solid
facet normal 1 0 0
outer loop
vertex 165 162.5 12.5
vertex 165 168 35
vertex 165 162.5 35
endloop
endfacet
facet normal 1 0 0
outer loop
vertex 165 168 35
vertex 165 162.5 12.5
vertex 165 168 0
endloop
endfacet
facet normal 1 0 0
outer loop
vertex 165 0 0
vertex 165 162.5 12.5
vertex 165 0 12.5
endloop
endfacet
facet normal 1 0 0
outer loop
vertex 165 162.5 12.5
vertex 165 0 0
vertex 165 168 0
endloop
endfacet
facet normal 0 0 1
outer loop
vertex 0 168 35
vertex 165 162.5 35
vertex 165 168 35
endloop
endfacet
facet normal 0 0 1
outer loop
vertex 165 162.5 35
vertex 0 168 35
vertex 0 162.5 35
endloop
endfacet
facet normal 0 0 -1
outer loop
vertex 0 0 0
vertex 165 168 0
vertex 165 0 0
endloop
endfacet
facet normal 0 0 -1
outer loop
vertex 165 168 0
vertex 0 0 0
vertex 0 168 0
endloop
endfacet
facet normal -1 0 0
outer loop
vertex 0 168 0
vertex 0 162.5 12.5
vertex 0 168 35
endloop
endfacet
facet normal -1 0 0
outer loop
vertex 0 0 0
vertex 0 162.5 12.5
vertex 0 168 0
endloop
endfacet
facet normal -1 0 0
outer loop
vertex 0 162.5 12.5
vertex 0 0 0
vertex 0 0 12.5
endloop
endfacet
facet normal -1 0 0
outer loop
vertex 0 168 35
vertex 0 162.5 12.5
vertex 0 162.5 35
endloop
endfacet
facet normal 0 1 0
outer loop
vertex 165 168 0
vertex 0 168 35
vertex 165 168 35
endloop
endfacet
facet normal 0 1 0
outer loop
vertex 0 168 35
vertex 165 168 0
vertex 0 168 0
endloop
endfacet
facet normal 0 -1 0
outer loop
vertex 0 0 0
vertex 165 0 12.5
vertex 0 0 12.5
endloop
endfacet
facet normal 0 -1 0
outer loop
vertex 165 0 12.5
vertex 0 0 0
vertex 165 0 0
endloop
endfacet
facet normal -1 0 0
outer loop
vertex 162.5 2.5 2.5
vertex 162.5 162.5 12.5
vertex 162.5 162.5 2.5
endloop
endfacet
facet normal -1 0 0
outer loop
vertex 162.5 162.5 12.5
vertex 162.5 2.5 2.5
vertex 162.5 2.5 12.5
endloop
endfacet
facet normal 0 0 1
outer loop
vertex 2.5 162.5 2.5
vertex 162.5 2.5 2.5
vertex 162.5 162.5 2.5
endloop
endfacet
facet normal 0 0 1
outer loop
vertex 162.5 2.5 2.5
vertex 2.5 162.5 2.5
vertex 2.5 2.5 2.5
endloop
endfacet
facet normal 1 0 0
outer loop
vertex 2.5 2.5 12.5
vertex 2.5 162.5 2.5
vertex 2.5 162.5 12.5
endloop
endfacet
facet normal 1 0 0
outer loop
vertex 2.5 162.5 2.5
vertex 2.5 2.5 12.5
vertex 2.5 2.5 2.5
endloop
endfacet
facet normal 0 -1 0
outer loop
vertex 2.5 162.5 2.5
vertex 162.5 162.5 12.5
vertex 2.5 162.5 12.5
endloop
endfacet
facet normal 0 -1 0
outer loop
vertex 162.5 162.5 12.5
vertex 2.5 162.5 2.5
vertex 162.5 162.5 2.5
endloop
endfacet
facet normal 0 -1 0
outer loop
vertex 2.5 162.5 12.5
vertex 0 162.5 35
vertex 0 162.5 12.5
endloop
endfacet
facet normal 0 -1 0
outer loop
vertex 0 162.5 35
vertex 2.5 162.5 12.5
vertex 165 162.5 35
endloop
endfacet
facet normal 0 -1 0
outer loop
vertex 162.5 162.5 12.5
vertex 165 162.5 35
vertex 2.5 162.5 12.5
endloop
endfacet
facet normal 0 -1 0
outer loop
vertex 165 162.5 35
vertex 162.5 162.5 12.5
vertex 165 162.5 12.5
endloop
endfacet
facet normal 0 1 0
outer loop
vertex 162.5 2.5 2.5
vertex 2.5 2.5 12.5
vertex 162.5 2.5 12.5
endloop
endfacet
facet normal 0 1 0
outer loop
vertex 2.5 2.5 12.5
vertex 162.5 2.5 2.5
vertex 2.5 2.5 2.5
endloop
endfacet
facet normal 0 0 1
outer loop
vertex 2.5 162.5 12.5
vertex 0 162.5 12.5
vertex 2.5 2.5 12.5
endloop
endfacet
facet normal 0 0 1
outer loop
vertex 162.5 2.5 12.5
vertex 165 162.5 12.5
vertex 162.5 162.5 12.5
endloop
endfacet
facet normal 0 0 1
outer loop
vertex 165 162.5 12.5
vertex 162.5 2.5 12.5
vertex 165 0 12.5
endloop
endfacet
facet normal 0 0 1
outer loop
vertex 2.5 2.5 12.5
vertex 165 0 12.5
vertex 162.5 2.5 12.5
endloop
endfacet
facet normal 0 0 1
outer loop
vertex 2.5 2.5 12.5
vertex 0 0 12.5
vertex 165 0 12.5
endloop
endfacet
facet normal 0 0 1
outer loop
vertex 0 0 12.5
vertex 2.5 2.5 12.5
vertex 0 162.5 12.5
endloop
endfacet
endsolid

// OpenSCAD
// cd stand organizer
// top
// 08.10.2026 Sebastian Weigl
 
// set the fregment sizes
$fn = $preview ? 48 : 64;

// vars
border=2.5;

difference() {
cube([165,168,35],false);

translate([border,border,border])
cube([160,160,30],false);
translate([-border,-border,12.5])
cube([170,165,35],false);

translate([145,160,22.5]) rotate([-90,0,0]) cylinder(d=3.8,h=10,true);
translate([20,160,22.5]) rotate([-90,0,0]) cylinder(d=3.8,h=10,true);
}
